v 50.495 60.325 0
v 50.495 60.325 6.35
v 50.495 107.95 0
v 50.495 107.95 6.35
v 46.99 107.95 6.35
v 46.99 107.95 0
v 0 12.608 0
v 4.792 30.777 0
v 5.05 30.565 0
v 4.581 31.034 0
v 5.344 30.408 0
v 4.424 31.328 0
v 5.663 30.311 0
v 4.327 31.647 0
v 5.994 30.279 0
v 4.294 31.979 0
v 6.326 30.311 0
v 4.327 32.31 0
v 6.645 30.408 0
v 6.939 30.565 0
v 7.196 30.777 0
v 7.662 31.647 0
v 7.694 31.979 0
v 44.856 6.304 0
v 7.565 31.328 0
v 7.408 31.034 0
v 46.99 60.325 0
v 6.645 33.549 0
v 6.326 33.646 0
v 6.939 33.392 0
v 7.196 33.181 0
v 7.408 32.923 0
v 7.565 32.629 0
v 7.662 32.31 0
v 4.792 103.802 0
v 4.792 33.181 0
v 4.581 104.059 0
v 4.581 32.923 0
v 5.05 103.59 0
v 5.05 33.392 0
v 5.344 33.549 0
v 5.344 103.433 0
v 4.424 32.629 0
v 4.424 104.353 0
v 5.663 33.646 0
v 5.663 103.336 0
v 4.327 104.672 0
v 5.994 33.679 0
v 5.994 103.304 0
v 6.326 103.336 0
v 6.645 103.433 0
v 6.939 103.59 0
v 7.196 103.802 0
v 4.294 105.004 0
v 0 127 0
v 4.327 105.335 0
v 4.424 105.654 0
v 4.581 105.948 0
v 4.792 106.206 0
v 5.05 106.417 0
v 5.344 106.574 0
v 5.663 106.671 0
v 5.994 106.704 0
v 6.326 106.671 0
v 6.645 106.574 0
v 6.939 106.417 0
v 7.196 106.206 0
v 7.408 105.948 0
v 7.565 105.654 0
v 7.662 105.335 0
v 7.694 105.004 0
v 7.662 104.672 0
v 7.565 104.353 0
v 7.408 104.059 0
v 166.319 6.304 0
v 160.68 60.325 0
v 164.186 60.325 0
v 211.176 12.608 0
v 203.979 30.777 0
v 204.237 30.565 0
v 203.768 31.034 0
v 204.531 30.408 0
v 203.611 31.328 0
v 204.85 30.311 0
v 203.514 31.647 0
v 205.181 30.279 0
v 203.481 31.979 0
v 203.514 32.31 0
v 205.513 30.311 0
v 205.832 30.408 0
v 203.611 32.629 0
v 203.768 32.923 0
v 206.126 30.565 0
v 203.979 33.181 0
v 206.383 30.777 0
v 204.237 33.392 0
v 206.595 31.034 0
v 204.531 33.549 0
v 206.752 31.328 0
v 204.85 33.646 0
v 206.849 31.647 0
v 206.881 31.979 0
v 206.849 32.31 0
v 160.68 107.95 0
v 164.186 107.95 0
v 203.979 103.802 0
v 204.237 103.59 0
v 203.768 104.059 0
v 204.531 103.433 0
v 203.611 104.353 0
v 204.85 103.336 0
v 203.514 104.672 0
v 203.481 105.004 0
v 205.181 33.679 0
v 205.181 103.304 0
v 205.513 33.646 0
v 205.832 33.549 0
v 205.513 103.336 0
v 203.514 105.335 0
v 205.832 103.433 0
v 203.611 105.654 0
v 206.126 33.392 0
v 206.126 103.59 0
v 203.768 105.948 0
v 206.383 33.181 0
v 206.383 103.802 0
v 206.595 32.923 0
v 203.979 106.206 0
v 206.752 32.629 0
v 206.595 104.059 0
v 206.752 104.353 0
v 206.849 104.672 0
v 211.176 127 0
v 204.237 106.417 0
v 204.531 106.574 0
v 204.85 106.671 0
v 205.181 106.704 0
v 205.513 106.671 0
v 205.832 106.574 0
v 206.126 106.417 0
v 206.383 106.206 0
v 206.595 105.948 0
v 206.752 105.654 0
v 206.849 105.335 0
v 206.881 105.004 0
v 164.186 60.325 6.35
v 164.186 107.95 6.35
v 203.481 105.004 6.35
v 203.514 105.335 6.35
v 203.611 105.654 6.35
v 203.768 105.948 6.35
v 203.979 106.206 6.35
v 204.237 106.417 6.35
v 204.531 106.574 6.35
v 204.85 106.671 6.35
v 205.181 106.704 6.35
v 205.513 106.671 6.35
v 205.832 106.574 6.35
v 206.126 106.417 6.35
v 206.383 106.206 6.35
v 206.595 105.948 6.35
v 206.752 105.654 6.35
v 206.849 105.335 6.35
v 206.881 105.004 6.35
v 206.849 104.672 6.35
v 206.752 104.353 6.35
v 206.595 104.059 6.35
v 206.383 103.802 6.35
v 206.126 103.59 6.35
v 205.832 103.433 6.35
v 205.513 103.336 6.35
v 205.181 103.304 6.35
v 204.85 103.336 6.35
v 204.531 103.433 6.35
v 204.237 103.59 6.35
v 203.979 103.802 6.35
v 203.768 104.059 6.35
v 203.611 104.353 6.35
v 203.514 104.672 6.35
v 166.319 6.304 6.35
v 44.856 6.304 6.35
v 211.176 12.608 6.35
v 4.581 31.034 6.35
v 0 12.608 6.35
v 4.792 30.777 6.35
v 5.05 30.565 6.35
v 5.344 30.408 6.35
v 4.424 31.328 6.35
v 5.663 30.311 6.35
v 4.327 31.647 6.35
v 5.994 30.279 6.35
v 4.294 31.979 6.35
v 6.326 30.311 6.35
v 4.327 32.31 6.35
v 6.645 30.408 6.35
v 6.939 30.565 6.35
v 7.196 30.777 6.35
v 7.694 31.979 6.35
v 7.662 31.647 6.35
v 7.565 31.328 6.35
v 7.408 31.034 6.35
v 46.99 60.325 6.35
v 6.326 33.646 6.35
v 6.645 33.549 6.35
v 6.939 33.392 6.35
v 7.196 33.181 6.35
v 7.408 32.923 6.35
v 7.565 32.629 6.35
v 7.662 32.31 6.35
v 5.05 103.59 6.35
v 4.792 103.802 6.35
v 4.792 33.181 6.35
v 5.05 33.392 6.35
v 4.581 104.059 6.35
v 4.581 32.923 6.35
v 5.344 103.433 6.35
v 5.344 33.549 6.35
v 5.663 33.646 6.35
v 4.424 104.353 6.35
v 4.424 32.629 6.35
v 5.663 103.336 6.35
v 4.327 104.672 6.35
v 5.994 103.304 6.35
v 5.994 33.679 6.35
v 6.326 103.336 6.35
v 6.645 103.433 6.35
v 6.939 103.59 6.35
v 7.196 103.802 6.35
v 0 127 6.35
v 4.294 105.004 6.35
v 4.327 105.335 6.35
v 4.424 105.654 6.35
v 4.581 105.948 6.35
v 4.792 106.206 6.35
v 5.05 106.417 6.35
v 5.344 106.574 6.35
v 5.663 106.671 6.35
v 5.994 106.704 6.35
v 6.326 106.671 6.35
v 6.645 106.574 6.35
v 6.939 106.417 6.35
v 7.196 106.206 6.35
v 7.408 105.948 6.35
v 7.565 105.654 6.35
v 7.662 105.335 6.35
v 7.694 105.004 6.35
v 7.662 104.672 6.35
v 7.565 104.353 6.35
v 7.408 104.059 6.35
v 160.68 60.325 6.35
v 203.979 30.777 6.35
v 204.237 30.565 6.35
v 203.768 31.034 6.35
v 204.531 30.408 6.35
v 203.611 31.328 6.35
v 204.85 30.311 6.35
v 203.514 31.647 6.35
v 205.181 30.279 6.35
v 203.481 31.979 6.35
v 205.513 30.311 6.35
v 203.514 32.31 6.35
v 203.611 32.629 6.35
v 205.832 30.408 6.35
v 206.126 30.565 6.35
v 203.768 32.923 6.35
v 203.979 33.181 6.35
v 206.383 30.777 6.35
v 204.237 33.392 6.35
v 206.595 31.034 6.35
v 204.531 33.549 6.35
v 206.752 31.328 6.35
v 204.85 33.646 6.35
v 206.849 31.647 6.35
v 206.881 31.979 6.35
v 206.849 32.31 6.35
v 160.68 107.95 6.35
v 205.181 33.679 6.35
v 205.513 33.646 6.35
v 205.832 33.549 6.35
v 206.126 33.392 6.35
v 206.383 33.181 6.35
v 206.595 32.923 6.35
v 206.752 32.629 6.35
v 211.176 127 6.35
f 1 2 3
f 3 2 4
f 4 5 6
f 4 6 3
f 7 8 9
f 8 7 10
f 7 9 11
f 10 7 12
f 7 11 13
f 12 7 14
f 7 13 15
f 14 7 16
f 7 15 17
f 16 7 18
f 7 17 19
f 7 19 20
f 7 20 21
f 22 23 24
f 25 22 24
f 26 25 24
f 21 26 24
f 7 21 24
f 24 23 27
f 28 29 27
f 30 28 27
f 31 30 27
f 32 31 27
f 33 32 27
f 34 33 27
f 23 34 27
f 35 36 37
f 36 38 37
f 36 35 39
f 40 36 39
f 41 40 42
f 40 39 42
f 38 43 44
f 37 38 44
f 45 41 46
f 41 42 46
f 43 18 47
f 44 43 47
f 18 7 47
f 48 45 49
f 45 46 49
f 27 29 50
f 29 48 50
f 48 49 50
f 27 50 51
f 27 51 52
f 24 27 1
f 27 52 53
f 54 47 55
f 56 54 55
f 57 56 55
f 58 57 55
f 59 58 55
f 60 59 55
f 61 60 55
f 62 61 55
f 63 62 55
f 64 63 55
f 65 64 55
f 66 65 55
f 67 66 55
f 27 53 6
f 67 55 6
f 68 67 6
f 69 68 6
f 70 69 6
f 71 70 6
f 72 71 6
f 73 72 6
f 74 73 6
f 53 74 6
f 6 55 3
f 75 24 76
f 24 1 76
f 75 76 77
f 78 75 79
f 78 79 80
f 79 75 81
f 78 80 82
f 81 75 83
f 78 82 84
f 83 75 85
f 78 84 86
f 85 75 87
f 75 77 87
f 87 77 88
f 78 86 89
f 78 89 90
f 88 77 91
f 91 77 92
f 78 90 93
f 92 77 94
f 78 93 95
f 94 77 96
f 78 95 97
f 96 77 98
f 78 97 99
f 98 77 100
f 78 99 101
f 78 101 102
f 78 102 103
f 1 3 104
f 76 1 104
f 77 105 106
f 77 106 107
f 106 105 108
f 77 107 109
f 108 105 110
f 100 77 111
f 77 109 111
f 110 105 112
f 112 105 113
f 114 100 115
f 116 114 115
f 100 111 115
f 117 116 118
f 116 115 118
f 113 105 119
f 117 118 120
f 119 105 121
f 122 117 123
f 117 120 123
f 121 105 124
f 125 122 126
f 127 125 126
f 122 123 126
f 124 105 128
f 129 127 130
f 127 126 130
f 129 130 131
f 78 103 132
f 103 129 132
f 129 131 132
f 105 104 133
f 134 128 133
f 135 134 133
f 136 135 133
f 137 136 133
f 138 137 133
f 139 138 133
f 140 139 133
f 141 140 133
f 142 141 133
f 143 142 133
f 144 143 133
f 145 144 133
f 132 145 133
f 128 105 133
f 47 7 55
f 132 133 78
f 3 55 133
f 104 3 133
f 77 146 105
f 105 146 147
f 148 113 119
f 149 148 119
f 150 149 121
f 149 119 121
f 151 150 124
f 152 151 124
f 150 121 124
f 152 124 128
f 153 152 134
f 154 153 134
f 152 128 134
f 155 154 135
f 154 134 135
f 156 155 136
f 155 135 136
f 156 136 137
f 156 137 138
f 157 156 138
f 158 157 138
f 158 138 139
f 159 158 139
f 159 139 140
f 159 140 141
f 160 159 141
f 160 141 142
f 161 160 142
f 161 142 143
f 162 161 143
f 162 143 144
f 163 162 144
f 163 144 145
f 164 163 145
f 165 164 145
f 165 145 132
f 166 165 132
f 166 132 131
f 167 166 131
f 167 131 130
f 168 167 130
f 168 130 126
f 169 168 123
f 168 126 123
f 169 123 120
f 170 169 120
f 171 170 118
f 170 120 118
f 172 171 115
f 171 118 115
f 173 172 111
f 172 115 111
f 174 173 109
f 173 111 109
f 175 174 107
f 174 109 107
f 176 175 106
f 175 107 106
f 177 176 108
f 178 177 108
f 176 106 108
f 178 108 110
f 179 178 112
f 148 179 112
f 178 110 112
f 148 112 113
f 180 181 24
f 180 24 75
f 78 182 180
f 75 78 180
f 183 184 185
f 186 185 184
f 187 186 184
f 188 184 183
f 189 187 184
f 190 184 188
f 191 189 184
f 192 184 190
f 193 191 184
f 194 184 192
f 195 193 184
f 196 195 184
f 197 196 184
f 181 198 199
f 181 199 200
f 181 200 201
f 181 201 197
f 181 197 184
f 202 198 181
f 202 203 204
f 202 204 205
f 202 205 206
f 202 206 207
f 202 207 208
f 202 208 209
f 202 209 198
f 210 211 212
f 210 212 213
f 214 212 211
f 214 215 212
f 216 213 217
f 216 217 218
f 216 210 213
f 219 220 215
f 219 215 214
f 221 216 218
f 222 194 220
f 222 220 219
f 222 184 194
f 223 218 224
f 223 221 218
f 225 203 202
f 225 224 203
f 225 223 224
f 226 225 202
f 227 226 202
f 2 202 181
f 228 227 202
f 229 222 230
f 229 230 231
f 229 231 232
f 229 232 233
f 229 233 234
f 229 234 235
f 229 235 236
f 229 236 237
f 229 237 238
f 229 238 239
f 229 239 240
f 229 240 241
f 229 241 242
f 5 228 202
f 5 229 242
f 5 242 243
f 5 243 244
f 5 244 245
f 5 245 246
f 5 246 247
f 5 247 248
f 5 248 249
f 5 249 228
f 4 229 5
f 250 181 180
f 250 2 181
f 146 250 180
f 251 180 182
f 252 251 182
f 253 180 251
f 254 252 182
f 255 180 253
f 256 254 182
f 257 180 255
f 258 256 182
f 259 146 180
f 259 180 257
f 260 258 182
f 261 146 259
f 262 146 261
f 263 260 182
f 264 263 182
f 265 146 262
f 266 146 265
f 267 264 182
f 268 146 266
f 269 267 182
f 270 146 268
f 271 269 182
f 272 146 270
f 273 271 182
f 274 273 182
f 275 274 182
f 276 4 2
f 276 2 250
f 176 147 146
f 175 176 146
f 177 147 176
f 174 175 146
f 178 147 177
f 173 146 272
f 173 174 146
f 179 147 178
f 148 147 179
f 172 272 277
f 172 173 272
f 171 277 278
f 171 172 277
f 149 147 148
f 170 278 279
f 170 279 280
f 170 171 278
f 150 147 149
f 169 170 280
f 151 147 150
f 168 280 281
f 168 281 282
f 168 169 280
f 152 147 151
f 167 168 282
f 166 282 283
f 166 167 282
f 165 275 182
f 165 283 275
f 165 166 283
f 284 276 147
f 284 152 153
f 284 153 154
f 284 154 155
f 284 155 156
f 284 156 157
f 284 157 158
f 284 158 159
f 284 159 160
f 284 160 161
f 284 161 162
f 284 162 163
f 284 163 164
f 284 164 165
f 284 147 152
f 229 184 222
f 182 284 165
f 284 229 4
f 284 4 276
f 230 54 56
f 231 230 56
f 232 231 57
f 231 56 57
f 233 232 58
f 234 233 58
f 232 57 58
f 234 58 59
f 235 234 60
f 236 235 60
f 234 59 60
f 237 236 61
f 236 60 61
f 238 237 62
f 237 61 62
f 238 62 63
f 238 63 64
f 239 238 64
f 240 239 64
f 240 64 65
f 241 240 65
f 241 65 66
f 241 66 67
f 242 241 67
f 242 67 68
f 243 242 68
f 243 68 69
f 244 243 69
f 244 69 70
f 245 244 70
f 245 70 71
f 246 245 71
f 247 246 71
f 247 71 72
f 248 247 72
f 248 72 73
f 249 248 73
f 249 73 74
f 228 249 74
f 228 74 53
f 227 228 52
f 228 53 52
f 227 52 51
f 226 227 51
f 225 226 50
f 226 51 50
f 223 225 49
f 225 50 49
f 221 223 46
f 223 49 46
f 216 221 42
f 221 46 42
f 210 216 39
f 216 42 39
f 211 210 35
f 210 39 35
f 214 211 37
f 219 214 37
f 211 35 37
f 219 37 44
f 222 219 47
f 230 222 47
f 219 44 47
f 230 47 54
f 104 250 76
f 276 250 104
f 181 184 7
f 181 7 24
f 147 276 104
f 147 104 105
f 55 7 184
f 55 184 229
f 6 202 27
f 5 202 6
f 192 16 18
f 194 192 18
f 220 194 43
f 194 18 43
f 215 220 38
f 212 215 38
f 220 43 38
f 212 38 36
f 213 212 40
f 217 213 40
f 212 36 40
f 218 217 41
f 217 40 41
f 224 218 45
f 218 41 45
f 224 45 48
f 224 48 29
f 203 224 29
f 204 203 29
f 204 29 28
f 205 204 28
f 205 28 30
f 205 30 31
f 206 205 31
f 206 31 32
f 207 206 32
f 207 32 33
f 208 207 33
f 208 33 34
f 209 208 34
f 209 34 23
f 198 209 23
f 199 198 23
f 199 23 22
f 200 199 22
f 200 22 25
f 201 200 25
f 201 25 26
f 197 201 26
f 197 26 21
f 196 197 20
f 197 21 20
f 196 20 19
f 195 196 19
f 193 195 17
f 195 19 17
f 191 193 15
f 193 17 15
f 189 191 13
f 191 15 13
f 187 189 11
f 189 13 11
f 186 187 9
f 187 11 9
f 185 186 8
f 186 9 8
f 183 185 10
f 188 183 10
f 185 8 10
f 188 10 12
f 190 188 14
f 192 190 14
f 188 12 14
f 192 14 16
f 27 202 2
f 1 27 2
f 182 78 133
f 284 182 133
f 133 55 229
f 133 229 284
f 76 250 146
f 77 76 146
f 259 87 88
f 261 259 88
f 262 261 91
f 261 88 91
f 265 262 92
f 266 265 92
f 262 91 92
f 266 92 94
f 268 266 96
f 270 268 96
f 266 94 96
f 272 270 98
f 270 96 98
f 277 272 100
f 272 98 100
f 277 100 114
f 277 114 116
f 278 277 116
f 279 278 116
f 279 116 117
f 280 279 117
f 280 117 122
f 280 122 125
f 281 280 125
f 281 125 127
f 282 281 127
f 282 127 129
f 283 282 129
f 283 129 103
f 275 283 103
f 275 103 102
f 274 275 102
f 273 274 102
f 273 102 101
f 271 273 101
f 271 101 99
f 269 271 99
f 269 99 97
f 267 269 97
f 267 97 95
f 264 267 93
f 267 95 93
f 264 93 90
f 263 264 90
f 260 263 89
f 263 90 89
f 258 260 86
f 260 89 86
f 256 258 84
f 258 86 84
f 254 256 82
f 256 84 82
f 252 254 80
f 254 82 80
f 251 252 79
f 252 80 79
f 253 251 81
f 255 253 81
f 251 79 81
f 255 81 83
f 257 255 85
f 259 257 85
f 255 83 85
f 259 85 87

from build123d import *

# Parameters (mm, degrees)
SKETCH1_W            = 211.1756
SKETCH1_H            = 127
BOSS_EXTRUDE1_DEPTH  = 6.35
M3_CLEARANCE_HOLE1_D = 3.4
SKETCH4_W            = 3.5052
SKETCH4_H            = 47.625
CUT_EXTRUDE1_DEPTH   = 247.50447569
CUT_EXTRUDE2_DEPTH   = 247.50447569
SKETCH6_W            = 121.4628
SKETCH6_H            = 6.35
CUT_EXTRUDE3_DEPTH   = 247.50447569


with BuildPart() as part:
    # Sketch1 → Boss-Extrude1 (new body)
    with BuildSketch(Plane.XY):
        with Locations((105.5878, 63.5)):
            Rectangle(SKETCH1_W, SKETCH1_H)
    extrude(amount=BOSS_EXTRUDE1_DEPTH)

    # M3 Clearance Hole1 (through all)
    with Locations(Plane.XY.offset(6.35)):
        with Locations((5.9944, 105.0036), (5.9944, 31.9786), (205.1812, 31.9786), (205.1812, 105.0036)):
            Hole(M3_CLEARANCE_HOLE1_D / 2)

    # Sketch4 → Cut-Extrude1 (cut, through all)
    with BuildSketch(Plane.XY.offset(6.35)):
        with Locations((48.7426, 84.1375)):
            Rectangle(SKETCH4_W, SKETCH4_H)
        with Locations((162.433, 84.1375)):
            Rectangle(SKETCH4_W, SKETCH4_H)
    extrude(amount=-CUT_EXTRUDE1_DEPTH, mode=Mode.SUBTRACT)

    # Sketch5 → Cut-Extrude2 (cut, through all)
    with BuildSketch(Plane.XY.offset(6.35)):
        Polygon((0, 12.608311795), (89.7128, 0), (0, 0), align=None)
        Polygon((121.4628, 0), (211.1756, 0), (211.1756, 12.608311795), align=None)
    extrude(amount=-CUT_EXTRUDE2_DEPTH, mode=Mode.SUBTRACT)

    # Sketch6 → Cut-Extrude3 (cut, through all)
    with BuildSketch(Plane.XY.offset(6.35)):
        with Locations((105.5878, 3.129155898)):
            Rectangle(SKETCH6_W, SKETCH6_H)
    extrude(amount=-CUT_EXTRUDE3_DEPTH, mode=Mode.SUBTRACT)


solid = part.part
